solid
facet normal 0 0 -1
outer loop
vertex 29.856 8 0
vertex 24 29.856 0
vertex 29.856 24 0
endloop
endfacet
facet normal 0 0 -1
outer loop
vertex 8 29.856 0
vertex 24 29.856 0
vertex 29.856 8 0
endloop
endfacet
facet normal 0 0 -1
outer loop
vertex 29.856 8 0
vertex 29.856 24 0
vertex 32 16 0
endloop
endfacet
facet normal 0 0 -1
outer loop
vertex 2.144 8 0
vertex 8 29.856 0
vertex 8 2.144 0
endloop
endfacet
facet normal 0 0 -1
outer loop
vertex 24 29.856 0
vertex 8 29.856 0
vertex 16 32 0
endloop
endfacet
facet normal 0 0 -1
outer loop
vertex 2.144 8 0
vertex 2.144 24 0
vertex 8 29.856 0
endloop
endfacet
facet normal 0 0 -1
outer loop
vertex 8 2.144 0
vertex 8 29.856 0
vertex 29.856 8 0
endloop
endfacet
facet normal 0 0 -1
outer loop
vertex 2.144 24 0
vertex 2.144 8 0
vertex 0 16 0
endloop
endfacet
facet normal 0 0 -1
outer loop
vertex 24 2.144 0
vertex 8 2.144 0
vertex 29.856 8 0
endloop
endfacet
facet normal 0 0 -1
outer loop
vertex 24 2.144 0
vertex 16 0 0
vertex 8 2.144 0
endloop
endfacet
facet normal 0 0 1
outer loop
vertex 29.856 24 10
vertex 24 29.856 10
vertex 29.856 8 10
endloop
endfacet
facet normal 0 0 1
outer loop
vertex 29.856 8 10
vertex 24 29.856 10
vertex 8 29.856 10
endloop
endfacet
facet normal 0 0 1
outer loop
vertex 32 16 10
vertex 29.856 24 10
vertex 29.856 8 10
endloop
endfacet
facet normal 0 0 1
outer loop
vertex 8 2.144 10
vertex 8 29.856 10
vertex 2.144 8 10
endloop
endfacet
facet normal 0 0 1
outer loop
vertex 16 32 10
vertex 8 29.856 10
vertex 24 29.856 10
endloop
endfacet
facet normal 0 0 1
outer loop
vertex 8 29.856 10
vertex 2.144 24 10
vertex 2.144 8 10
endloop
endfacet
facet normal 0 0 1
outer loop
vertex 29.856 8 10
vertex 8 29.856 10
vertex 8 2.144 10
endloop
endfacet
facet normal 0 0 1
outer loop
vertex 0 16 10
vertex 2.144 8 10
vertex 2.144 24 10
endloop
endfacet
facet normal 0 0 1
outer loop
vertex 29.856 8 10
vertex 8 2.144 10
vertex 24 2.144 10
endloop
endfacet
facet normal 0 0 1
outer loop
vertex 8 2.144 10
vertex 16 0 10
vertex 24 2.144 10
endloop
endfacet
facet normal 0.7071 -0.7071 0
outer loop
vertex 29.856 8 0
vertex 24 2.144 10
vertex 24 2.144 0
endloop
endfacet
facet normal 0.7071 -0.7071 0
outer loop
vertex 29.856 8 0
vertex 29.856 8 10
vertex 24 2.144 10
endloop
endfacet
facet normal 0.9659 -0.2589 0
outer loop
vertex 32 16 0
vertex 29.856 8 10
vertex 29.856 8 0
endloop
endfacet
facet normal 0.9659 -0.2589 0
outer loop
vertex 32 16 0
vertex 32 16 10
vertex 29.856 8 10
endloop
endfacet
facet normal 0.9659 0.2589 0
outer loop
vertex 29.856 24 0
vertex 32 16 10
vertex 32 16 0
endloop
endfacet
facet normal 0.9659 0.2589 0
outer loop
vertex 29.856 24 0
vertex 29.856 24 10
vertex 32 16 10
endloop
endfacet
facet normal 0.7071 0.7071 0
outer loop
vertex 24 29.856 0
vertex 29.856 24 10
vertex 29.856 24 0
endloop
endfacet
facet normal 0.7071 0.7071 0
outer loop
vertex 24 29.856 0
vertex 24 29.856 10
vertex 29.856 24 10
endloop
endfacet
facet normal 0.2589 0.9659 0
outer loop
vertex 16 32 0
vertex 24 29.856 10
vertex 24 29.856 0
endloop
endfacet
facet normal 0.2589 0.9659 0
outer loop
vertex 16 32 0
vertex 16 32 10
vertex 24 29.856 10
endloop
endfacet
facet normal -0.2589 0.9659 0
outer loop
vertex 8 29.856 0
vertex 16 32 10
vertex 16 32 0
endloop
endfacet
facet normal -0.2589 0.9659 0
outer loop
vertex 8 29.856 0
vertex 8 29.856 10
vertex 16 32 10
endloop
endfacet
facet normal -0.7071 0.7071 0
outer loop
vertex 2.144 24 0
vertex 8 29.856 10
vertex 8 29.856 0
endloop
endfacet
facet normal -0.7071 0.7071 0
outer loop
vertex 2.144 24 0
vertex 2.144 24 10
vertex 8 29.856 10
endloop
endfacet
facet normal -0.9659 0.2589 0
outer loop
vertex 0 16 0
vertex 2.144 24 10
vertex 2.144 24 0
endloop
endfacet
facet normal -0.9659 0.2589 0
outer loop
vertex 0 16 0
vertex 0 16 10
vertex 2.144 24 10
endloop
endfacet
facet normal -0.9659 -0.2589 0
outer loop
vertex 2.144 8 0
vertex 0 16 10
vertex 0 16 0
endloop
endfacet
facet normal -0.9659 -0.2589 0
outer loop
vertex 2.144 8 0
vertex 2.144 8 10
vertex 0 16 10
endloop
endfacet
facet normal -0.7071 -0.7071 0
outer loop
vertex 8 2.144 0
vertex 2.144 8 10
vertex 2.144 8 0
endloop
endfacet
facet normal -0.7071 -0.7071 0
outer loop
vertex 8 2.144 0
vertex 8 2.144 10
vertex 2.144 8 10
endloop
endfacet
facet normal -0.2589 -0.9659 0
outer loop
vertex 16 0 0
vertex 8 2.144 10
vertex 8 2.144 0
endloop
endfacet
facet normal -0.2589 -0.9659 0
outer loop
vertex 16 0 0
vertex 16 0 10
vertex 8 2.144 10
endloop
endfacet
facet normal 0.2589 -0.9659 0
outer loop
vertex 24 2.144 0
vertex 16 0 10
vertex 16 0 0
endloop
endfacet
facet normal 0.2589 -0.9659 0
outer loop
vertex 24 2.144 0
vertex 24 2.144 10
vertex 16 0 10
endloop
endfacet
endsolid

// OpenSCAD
$fn = 32;

// ----------------------------------------------------------------------
// Eccentric disc: egg, 10 mm thick
// ----------------------------------------------------------------------

// --- parameters (mm) ---
profile_height = 10;      // extrusion height
profile_points = 12;      // points of the closed outline

profile = [[0, 16], [2.144, 8], [8, 2.144], [16, 0], [24, 2.144], [29.856, 8], [32, 16], [29.856, 24], [24, 29.856], [16, 32], [8, 29.856], [2.144, 24]];  // single closed polygon, 12 points, counter clockwise

// --- the one profile operation ---
linear_extrude(height = profile_height) polygon(points = profile);
